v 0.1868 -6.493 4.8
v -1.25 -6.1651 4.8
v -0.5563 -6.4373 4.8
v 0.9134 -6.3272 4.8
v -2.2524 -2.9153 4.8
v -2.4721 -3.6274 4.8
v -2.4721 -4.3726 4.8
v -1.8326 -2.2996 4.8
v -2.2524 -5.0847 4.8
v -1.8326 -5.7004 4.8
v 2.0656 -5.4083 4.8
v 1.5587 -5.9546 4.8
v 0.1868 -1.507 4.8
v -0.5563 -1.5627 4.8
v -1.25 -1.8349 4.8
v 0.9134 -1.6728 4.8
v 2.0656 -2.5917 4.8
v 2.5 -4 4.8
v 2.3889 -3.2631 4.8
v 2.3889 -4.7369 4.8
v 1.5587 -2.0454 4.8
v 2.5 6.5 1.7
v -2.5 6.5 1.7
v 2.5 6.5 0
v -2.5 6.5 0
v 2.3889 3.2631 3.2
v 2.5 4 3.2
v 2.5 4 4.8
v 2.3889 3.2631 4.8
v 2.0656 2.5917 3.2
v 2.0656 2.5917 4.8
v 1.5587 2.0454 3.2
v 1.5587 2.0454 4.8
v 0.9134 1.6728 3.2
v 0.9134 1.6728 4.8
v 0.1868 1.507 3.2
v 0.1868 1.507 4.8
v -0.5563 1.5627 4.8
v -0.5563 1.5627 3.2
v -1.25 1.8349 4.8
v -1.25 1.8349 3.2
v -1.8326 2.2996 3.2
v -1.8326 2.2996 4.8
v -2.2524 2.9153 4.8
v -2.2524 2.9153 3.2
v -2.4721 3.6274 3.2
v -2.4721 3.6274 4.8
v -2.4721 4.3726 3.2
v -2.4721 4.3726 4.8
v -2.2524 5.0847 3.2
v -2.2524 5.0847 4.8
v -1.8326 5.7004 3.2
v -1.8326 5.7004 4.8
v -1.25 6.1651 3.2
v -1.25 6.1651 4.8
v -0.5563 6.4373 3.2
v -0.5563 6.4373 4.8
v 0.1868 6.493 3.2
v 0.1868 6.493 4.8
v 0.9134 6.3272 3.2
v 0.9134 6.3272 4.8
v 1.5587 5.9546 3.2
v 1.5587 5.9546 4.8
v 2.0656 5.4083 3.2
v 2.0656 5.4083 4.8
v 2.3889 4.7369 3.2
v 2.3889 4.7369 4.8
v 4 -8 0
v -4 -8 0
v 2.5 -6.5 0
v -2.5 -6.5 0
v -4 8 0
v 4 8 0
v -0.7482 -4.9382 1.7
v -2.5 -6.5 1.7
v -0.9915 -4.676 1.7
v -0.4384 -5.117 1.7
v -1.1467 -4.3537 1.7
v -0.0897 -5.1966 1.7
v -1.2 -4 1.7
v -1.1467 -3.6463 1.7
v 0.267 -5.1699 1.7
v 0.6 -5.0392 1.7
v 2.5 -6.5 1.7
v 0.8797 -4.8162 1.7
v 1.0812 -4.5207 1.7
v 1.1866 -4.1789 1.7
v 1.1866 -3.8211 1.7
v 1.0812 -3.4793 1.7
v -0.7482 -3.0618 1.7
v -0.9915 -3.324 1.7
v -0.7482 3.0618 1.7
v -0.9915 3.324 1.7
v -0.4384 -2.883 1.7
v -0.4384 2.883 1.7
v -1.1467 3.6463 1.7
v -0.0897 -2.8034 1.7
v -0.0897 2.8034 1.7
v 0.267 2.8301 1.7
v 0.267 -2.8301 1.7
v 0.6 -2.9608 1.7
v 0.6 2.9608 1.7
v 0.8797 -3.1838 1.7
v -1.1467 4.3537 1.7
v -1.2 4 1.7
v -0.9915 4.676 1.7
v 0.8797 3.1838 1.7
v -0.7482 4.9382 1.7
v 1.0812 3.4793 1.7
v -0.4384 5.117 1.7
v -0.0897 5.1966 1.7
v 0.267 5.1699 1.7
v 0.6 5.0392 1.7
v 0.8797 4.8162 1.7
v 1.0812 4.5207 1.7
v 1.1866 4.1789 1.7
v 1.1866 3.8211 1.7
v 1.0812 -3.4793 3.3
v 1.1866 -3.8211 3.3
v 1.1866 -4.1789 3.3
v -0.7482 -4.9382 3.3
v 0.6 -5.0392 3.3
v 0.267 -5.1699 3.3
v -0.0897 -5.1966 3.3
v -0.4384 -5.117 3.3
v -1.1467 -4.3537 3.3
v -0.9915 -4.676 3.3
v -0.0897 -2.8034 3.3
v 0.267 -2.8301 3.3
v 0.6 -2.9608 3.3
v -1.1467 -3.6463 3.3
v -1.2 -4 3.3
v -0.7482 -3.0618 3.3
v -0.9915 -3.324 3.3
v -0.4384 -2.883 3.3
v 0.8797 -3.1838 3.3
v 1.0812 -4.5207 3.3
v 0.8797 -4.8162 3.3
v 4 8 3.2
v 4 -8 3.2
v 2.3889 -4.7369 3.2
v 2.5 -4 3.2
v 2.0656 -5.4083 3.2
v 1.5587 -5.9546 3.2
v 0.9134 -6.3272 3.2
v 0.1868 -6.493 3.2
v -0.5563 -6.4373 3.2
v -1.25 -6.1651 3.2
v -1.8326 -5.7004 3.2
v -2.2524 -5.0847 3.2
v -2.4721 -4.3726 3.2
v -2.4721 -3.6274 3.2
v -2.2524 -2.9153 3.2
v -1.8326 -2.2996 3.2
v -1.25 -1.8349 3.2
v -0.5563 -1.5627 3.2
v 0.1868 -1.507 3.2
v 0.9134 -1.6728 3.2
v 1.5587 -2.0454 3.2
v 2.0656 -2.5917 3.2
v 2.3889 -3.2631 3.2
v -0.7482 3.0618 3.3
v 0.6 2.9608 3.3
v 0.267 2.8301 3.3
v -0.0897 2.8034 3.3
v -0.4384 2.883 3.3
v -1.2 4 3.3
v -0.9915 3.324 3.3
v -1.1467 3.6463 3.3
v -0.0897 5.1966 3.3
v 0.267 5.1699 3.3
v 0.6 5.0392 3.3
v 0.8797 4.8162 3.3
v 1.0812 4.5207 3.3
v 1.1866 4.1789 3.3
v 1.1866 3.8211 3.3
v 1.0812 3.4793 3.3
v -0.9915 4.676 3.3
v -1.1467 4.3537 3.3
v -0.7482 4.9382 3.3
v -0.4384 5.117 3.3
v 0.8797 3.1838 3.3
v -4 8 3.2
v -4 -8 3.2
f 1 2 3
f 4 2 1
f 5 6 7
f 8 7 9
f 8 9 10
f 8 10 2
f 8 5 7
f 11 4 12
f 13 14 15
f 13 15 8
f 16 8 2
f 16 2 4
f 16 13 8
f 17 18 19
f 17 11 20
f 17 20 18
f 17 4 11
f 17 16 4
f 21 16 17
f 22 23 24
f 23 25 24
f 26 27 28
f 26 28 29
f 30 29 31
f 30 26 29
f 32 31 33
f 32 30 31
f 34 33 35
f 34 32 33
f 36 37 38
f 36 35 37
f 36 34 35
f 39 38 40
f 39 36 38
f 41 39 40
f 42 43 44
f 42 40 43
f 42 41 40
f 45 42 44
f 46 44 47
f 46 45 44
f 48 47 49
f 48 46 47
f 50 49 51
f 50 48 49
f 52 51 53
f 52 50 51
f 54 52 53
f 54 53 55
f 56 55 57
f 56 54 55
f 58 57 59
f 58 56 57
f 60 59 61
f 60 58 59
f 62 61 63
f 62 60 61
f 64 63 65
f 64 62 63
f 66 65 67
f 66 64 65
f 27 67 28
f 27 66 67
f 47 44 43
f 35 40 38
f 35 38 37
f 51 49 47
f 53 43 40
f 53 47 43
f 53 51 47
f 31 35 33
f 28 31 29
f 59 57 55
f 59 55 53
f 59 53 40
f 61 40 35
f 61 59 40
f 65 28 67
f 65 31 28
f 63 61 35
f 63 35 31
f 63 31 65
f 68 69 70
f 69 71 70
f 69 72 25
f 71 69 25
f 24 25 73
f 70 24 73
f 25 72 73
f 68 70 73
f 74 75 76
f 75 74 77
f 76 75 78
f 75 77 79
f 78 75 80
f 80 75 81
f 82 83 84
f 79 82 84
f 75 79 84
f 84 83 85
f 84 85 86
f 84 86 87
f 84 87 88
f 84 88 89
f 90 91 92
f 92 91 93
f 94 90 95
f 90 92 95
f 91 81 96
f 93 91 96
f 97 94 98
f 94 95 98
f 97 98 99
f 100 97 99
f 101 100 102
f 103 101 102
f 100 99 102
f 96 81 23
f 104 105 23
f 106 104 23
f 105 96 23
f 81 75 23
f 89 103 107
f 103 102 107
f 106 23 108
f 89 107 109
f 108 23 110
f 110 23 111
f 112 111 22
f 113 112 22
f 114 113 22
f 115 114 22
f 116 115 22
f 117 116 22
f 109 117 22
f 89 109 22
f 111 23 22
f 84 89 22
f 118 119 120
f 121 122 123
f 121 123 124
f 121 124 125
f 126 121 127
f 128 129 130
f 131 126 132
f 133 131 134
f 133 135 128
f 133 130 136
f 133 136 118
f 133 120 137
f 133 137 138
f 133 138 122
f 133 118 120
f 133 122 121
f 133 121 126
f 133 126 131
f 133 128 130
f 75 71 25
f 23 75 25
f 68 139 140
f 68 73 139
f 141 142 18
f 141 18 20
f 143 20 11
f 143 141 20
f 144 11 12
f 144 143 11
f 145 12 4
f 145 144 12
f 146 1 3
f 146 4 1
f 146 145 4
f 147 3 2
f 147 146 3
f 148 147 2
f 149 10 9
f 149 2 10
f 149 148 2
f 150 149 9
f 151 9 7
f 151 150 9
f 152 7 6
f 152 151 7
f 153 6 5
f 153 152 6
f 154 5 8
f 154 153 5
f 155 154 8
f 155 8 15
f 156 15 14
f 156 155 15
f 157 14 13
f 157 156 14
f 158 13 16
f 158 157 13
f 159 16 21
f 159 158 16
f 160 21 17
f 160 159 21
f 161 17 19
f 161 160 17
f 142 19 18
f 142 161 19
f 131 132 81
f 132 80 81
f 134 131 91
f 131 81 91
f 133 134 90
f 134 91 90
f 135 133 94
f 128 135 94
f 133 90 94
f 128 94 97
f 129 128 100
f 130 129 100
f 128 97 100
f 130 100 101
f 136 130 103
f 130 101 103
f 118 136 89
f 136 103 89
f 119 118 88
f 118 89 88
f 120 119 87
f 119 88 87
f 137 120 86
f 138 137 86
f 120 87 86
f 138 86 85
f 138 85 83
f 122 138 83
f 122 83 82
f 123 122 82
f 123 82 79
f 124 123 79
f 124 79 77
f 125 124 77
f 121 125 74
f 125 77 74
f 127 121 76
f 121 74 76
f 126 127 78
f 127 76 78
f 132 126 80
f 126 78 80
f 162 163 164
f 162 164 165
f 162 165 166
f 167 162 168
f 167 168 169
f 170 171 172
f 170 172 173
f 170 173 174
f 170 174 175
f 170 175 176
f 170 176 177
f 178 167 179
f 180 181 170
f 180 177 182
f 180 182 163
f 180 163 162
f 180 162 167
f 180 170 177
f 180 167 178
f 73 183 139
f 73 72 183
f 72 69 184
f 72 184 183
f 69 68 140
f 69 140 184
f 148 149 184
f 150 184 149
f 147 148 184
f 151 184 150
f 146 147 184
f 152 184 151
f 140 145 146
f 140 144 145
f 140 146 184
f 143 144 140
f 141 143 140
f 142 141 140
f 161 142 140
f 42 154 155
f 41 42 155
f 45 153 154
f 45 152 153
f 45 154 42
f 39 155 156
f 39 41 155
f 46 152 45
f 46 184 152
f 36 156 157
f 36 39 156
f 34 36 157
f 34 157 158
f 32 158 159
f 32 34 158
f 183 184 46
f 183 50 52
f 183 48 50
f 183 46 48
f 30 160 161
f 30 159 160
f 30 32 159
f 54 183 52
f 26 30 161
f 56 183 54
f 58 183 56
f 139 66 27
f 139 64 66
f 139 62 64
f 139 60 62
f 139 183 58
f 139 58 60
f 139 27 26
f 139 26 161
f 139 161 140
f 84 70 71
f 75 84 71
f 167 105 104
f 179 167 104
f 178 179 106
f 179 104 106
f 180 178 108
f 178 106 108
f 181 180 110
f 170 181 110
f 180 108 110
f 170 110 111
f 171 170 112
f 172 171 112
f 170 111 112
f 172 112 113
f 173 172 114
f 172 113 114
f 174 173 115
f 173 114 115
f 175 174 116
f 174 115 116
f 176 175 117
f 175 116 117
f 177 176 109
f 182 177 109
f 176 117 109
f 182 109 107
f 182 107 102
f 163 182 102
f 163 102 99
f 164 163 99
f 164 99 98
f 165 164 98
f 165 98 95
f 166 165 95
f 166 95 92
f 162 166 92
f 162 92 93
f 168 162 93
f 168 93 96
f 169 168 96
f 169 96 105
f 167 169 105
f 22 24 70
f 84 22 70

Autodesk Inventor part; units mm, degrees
ref_plane "YZ Plane" through (0, 0, 0) normal (1, 0, 0) x (0, 1, 0)
ref_plane "XZ Plane" through (0, 0, 0) normal (0, 1, 0) x (-1, 0, 0)
ref_plane "XY Plane" through (0, 0, 0) normal (0, 0, 1) x (1, 0, 0)
sketch "Sketch1" plane through (0, 0, 0) normal (0, 0, 1) x (1, 0, 0)
  line L0 (-4, 8) -> (4, 8)
  line L1 (4, 8) -> (4, -8)
  line L2 (4, -8) -> (-4, -8)
  line L3 (-4, -8) -> (-4, 8)
  point P0 (0, 0)
  dimension "d0" = 8
  dimension "d1" = 16
  dimension "d2" = 4
  dimension "d3" = 8
extrude "Extrusion1" add sketch "Sketch1" along normal blind 3.2
shell "Shell1" thickness 1.5 removed faces 1 at (-1.3333, 2.6667, 0)
sketch "Sketch2" plane through (0, 0, 3.2) normal (0, 0, 1) x (1, 0, 0)
  circle A0 centre (0, -4) radius 2.5
  line L0 (4, 8) -> (4, -8) projected
  line L1 (4, -8) -> (-4, -8) projected
  dimension "d7" = 5
  dimension "d10" = 4
  dimension "d11" = 4
extrude "Extrusion2" add sketch "Sketch2" along normal blind 1.6
sketch "Sketch3" plane through (2.5, -6.5, 1.7) normal (0, 0, -1) x (-1, 0, 0)
  circle A0 centre (2.5, 2.5) radius 2.5 projected
  circle A1 centre (2.5, 2.5) radius 1.2
  point P0 (2.5, 6.5)
  dimension "d18" = 2.4
extrude "Extrusion3" cut sketch "Sketch3" against normal blind 1.6 contours A1
pattern_linear "Rectangular Pattern1" count 2 spacing 8 along (0, 1, 0) of "Extrusion2", "Extrusion3"
sketch "Sketch4" plane through (2.5, -6.5, 1.7) normal (0, 0, -1) x (-1, 0, 0)
  circle A0 centre (2.5, 10.5) radius 1.2 projected
  circle A1 centre (2.5, 2.5) radius 1.2 projected
  line L0 (0, 13) -> (0, 0) projected
  line L1 (0, 0) -> (5, 0) projected
  circle A2 centre (6.5, 6.5) radius 3.15
  circle A3 centre (6.5, 6.5) radius 2.5
  point P0 (2.5, 6.5)
  dimension "d21" = 6.5
  dimension "d22" = 6.5
  dimension "d23" = 10.5
  dimension "d24" = 2.5
  dimension "d25" = 5
  dimension "d26" = 6.3
extrude "Extrusion4" [suppressed]
pattern_linear "Rectangular Pattern2" [suppressed]
equation "\"d0\" = 8 * WIDTH"
equation "\"d1\" = 8 * LENGTH"
equation "\"d2\" = 0.5 * d0"
equation "\"d3\" = 0.5 * d1"
equation "\"d4\" = HEIGHT"
equation "\"d21\" = 0.5 * d23 + 0.5 * d24"
equation "\"d22\" = d21"
equation "\"WIDTH\" = 1"
equation "\"HEIGHT\" = 3.2"
equation "\"LENGTH\" = 2"
properties part number "3023" material "Steel"
